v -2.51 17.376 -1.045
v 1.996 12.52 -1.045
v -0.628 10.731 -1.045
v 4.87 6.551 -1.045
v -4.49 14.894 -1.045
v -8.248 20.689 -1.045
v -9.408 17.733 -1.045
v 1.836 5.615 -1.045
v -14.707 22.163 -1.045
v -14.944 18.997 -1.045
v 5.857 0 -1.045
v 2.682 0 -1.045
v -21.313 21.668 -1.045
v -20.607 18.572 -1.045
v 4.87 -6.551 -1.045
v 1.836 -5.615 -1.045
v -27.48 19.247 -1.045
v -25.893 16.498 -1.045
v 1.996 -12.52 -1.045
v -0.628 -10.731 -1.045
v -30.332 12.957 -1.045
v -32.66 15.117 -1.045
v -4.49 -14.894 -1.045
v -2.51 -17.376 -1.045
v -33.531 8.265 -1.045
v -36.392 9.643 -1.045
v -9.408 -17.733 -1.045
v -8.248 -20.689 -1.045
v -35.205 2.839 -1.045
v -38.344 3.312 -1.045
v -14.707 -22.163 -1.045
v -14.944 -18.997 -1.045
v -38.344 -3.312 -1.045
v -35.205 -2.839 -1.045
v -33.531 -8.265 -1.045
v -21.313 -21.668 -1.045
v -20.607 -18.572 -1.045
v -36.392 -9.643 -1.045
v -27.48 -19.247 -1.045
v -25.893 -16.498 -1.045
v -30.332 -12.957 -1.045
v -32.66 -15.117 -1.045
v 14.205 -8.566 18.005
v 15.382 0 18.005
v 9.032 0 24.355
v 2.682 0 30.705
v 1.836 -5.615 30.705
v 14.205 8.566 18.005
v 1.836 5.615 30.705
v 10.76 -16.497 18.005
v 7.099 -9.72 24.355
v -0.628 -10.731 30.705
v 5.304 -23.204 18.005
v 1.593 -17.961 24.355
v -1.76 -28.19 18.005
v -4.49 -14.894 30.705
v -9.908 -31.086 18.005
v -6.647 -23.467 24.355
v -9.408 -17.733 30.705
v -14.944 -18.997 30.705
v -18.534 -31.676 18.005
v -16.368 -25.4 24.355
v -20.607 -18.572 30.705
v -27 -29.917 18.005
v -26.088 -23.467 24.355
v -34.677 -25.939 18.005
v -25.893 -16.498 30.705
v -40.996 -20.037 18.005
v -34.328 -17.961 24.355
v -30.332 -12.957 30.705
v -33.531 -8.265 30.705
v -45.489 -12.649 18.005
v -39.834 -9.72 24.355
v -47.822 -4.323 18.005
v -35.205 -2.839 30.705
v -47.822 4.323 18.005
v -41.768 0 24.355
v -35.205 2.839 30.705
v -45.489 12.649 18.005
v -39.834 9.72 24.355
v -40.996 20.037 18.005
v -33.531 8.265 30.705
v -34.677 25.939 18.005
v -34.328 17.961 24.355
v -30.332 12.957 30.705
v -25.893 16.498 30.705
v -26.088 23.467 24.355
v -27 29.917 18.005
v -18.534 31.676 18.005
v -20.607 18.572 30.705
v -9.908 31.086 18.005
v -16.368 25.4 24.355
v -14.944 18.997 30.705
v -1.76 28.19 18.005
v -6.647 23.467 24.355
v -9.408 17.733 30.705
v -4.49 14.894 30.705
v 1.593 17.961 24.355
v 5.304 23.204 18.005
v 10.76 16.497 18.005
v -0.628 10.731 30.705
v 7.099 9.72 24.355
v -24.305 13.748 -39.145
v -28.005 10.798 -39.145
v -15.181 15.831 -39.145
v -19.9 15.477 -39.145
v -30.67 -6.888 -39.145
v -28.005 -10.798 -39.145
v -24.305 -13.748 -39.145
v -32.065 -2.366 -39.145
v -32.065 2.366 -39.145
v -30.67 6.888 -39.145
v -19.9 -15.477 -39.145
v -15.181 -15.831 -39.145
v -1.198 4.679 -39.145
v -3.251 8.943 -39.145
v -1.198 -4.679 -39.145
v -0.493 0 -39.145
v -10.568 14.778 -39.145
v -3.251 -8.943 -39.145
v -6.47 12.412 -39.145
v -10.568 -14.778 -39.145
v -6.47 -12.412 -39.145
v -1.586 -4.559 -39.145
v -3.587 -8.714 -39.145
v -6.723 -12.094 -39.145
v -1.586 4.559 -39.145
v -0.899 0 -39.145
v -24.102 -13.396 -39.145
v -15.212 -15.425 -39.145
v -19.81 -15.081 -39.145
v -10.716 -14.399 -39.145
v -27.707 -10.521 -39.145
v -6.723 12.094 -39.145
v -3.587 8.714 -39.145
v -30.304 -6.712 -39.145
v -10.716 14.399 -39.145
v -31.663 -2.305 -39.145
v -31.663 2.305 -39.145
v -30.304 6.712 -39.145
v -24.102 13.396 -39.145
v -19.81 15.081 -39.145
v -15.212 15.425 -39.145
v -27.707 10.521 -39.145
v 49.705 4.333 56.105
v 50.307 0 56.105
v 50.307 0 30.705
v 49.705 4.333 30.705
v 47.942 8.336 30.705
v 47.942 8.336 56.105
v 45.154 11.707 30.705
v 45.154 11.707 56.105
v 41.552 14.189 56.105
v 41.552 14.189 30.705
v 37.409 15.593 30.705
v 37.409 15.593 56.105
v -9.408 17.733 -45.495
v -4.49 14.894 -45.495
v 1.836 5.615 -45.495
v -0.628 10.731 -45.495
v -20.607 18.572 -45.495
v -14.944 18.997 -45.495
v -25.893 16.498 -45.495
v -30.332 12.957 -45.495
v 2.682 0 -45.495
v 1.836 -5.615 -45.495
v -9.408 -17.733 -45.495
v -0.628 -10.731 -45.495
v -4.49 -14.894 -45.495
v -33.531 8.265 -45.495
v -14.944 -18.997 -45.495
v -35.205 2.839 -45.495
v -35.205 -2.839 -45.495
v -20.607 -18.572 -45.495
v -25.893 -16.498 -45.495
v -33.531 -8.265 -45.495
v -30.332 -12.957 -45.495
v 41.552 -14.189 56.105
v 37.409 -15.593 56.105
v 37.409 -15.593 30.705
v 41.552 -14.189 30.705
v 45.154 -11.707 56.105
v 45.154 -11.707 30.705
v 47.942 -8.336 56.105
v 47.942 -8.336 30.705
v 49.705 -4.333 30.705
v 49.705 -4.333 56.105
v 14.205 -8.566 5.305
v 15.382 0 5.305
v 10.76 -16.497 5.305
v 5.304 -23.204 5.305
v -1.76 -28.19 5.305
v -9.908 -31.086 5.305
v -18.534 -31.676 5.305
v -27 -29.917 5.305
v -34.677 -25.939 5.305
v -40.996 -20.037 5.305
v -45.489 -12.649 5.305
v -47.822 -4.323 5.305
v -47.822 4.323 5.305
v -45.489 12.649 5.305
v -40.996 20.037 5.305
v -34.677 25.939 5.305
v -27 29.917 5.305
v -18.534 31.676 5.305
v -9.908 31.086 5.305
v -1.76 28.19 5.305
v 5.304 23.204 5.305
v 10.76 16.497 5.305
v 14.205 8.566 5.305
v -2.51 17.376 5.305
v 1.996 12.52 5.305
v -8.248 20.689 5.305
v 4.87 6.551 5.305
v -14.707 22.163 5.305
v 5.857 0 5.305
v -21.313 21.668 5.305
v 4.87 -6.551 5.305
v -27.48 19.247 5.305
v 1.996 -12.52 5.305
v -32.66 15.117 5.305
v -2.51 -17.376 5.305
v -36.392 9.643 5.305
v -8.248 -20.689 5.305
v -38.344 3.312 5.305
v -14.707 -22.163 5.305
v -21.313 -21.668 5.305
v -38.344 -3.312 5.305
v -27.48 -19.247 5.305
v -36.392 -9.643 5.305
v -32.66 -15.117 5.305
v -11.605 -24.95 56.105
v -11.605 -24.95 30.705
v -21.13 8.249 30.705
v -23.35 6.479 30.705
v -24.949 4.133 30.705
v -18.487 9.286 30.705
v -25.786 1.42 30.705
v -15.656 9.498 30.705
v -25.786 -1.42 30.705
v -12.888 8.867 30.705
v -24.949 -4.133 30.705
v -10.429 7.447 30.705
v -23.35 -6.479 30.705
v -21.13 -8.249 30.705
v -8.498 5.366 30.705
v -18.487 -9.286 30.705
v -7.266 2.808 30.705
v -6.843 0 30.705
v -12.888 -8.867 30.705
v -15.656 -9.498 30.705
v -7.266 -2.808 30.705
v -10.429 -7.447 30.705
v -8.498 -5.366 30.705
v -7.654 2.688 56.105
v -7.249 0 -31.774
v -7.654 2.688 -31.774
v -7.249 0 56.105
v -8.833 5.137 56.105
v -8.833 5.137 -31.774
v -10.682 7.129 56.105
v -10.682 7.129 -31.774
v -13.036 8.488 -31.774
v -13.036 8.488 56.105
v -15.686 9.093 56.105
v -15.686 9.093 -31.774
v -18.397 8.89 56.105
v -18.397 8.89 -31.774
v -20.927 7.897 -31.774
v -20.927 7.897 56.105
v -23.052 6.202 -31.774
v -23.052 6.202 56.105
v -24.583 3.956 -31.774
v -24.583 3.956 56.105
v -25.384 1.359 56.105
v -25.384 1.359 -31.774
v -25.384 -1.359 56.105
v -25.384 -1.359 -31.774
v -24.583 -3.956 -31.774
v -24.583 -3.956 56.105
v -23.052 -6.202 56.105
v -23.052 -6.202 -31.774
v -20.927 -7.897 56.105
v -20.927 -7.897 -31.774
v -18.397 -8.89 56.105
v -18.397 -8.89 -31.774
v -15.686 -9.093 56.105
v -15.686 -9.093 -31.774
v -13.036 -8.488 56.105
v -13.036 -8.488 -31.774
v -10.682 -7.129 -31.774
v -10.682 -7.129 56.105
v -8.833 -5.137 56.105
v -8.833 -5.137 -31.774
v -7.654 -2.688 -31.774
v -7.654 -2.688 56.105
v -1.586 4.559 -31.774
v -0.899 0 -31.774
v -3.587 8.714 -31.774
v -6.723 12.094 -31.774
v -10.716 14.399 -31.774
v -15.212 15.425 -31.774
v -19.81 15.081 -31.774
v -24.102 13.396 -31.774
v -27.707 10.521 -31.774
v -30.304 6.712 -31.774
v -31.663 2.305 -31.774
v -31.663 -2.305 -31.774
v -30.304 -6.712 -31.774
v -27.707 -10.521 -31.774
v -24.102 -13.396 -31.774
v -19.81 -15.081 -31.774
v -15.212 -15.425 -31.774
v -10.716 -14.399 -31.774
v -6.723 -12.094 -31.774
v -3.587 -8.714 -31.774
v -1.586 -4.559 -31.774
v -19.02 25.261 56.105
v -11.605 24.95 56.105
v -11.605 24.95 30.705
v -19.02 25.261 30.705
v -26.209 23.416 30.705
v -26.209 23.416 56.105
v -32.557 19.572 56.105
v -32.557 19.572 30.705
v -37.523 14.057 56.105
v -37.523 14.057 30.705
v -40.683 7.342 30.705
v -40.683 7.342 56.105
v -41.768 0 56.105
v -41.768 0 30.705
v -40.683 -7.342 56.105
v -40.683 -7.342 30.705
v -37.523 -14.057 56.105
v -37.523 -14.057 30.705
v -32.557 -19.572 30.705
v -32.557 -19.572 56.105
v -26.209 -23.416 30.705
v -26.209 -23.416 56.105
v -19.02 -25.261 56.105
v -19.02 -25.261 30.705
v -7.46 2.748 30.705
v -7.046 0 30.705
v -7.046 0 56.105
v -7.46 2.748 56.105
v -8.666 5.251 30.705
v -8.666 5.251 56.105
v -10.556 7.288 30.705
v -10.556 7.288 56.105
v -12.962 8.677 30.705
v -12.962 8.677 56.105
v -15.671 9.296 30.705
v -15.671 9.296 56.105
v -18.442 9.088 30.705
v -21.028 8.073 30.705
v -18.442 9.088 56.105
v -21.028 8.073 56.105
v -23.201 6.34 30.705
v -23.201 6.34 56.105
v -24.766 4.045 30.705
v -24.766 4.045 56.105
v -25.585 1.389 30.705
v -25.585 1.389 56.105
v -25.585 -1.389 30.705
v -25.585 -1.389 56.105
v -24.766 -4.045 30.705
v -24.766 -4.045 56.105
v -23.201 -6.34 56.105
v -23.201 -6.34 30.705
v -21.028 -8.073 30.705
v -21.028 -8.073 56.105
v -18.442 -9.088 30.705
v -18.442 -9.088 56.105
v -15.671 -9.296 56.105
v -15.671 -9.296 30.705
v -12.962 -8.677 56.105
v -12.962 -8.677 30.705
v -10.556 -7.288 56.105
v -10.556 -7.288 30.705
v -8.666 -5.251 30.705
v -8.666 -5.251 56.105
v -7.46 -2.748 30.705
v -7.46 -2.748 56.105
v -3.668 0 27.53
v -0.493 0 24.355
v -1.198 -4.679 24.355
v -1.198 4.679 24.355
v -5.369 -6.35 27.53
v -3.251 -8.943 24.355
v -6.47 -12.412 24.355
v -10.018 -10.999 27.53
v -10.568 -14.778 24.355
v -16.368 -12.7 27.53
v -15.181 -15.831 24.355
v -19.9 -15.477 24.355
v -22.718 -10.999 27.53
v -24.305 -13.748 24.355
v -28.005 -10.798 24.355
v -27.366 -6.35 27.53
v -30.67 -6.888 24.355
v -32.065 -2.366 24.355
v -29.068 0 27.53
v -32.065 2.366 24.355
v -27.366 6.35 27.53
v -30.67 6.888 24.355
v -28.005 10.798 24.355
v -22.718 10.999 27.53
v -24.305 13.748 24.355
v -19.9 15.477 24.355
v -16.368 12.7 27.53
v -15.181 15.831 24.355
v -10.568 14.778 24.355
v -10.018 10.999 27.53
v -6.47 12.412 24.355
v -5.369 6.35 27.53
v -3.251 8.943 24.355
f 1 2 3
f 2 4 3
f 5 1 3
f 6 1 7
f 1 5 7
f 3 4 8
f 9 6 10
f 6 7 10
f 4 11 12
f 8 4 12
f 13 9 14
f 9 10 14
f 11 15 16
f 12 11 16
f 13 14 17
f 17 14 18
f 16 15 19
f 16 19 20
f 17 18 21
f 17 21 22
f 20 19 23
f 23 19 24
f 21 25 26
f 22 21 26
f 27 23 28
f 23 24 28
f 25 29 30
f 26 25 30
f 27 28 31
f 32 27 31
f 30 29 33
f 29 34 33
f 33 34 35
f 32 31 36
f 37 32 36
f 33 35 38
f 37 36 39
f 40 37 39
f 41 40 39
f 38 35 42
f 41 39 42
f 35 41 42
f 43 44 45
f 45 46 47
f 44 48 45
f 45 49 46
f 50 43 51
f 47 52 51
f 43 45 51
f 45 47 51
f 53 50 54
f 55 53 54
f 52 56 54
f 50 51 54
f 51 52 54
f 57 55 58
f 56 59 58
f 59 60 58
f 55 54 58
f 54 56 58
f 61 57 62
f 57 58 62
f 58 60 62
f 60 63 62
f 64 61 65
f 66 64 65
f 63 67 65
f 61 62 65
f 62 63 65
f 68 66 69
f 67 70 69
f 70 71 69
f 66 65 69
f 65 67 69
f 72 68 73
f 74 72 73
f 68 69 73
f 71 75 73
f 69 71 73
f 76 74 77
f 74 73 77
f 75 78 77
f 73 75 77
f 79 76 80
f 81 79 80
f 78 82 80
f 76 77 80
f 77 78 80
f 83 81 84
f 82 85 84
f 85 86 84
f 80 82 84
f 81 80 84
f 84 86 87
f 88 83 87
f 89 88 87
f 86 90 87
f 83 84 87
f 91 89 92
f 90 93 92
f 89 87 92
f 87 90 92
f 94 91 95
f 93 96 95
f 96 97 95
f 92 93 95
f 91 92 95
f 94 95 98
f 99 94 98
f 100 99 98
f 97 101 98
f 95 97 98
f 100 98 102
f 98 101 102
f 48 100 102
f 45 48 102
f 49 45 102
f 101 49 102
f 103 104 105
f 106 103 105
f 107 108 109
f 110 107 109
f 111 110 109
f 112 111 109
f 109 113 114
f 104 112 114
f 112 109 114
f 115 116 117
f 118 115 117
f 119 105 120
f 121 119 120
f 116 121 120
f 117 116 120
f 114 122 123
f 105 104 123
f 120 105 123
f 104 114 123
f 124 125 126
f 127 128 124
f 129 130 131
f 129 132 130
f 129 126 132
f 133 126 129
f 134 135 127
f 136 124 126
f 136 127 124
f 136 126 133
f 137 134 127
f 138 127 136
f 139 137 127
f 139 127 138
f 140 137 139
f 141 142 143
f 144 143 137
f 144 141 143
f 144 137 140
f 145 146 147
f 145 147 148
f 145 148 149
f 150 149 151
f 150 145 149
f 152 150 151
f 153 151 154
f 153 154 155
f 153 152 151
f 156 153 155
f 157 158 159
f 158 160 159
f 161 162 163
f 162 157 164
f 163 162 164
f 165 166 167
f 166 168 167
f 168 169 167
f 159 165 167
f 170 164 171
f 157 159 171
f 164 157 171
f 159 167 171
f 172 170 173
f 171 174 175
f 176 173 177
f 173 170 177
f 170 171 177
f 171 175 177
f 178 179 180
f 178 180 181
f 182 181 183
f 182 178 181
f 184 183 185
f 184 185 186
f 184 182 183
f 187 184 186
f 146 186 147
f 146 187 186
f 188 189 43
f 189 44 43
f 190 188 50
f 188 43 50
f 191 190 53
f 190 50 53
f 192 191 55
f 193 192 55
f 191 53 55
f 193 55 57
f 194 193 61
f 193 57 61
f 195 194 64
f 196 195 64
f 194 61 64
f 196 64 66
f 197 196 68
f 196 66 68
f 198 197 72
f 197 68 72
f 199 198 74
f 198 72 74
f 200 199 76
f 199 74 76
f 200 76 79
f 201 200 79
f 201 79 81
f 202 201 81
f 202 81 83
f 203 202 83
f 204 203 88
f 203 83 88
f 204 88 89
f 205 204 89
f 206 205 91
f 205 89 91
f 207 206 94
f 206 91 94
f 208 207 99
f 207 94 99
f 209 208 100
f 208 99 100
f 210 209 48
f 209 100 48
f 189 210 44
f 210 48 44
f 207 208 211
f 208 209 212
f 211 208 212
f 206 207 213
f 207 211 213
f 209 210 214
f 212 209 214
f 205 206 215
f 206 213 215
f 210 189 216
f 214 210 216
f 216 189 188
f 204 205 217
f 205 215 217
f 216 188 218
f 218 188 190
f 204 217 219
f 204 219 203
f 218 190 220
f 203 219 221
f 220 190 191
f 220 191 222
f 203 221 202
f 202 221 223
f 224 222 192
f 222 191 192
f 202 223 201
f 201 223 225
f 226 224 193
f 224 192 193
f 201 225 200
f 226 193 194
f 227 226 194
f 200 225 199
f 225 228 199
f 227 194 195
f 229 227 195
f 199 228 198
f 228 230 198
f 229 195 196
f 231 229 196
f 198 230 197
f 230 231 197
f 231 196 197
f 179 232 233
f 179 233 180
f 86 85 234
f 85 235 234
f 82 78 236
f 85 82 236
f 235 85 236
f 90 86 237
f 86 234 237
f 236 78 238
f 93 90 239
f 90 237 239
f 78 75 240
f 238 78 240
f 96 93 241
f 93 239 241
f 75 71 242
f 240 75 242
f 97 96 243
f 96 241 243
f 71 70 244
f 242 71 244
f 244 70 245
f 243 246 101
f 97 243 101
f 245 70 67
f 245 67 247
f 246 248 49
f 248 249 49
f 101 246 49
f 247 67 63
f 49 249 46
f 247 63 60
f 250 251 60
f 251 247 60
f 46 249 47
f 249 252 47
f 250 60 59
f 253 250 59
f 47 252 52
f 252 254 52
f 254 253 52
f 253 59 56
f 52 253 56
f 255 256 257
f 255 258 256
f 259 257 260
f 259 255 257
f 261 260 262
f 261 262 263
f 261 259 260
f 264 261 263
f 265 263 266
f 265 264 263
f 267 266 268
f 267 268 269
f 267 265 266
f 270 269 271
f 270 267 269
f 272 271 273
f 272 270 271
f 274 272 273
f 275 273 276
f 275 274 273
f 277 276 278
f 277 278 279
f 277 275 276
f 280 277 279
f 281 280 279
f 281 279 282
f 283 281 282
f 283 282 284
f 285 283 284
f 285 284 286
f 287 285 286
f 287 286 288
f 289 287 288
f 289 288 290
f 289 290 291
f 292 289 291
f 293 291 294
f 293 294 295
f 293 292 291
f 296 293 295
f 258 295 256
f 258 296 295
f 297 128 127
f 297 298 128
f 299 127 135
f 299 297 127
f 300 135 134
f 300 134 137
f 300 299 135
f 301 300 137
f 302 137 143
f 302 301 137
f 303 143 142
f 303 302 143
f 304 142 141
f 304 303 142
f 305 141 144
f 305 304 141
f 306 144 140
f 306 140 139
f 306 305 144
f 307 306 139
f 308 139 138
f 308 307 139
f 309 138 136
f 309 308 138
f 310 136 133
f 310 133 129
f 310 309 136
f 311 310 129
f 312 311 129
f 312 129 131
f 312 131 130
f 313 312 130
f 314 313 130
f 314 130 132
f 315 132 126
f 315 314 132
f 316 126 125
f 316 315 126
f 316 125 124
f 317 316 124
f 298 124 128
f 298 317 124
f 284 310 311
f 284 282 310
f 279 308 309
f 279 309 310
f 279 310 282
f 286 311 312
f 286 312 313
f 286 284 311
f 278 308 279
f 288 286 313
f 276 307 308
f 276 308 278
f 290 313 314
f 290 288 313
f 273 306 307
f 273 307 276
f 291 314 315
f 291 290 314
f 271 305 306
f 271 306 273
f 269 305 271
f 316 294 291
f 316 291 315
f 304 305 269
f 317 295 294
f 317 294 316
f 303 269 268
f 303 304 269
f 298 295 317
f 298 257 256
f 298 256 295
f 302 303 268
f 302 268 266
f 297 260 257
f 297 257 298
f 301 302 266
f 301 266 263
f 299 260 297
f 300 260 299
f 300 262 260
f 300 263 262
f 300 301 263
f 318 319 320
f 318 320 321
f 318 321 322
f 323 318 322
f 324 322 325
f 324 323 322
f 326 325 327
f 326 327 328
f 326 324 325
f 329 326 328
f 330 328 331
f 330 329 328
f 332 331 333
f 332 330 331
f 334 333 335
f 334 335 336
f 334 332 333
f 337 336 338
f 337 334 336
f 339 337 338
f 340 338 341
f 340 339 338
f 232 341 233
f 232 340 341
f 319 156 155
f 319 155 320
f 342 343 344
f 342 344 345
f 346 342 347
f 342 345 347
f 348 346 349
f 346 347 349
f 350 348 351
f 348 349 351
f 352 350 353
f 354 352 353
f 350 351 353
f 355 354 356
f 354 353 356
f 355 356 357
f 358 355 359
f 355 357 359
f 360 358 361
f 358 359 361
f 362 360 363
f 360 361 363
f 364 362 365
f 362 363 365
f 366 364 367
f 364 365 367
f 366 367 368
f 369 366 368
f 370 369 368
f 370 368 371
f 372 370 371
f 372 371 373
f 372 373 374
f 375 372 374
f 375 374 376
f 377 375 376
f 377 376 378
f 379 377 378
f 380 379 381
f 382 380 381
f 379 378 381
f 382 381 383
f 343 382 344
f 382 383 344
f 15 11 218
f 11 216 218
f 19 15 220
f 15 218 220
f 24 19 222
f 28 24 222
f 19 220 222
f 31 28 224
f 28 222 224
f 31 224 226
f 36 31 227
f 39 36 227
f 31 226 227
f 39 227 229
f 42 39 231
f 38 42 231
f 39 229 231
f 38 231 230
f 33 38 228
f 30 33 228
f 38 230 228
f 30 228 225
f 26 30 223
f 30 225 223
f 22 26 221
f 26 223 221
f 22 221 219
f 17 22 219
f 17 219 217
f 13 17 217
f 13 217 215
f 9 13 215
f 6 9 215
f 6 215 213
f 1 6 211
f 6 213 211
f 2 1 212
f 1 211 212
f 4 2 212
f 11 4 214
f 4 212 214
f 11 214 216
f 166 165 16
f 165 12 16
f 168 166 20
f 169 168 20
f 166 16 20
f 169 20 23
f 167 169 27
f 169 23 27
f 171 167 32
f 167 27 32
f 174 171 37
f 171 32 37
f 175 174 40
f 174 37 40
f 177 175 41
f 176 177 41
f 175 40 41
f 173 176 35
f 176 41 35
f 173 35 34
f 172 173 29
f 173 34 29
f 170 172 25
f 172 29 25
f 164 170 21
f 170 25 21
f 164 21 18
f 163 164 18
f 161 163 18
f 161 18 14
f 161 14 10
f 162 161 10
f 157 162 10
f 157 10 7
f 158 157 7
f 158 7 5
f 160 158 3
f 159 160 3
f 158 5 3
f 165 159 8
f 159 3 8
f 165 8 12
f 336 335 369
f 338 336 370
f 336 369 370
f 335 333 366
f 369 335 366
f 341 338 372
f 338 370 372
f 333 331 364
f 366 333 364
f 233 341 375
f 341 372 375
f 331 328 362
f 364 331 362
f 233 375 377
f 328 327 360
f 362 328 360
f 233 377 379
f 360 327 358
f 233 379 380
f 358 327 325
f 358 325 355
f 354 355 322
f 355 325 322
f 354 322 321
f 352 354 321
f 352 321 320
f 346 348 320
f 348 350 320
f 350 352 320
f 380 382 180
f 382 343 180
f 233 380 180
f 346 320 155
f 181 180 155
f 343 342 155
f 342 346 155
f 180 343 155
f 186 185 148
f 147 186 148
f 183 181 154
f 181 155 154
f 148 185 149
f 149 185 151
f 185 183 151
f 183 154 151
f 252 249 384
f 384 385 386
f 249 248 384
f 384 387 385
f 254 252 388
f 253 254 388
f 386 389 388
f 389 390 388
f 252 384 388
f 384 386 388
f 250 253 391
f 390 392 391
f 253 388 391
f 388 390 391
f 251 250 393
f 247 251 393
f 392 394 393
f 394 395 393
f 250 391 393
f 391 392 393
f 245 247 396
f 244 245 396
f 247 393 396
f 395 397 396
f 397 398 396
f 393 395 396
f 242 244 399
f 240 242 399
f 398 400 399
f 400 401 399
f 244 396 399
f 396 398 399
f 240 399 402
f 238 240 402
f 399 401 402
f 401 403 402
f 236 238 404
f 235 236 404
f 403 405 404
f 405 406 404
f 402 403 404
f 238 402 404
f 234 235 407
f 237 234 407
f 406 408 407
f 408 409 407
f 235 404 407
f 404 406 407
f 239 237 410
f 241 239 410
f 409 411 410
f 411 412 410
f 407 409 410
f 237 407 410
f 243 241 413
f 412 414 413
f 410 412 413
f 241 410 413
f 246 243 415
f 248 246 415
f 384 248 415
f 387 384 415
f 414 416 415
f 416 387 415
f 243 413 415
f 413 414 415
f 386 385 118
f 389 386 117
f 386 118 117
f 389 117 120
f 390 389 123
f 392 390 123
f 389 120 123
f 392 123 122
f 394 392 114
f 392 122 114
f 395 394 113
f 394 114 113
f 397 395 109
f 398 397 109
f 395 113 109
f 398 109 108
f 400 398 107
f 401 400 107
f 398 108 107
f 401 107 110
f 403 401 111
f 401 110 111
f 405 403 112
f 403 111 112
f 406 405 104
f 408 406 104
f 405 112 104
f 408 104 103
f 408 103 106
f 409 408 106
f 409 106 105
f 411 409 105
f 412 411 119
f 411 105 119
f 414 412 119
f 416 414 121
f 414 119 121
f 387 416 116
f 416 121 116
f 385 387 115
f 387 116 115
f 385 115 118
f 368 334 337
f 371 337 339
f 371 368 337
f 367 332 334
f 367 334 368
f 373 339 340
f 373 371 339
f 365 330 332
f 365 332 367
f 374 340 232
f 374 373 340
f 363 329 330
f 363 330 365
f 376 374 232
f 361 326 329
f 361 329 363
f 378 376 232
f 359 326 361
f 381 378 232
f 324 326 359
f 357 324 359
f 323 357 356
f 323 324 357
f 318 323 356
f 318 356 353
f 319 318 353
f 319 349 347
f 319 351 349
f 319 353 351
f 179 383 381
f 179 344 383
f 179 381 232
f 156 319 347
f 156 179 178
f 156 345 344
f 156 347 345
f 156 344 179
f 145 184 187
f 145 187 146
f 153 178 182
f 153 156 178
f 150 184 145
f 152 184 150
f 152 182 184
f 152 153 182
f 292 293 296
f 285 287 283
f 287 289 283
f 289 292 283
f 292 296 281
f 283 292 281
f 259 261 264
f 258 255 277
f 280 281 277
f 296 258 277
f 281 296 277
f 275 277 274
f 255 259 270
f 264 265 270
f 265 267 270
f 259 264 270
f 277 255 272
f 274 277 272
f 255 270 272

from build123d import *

# Parameters (mm, degrees)
F0_W     = 9.1186
F0_H     = 25.4
F3_R     = 9.3218
F4_DEPTH = 25.4


with BuildPart() as f1:
    # F0 (on Front) → F1 (revolve)
    with BuildSketch(Plane.XZ):
        Polygon((2.682442, 30.704564), (-6.842558, 30.704564), (-0.492558, 24.354564), (-0.492558, -39.145436), (-0.898958, -39.145436), (-16.367558, -39.145436), (-16.367558, -45.495436), (2.682442, -45.495436), (2.682442, -1.045436), (5.857442, -1.045436), (5.857442, 5.304564), (15.382442, 5.304564), (15.382442, 18.004564), align=None)
    revolve(axis=Axis((-16.367558, 0, -15.134403), (0, 0, -1)))


with BuildPart() as f2:
    # F0 (on Front) → F2 (revolve)
    with BuildSketch(Plane.XZ):
        with Locations((-11.808258, 43.404564)):
            Rectangle(F0_W, F0_H)
        Polygon((-7.248958, -31.773925), (-7.248958, 30.704564), (-16.367558, 30.704564), (-16.367558, -39.145436), (-0.898958, -39.145436), (-0.898958, -31.773925), align=None)
    revolve(axis=Axis((-16.367558, 0, 43.404564), (0, 0, 1)))


with BuildPart() as f4:
    # F3 (on face) → F4 (new body)
    with BuildSketch(Plane.XY.offset(56.104564)):
        with BuildLine():
            ThreePointArc((-11.605058, -24.949521), (3.204457, -16.189387), (9.032442, 0))
            ThreePointArc((9.032442, 0), (3.204457, 16.189387), (-11.605058, 24.949521))
            ThreePointArc((-11.605058, 24.949521), (-41.767558, 0), (-11.605058, -24.949521))
        make_face()
        with Locations((-16.367558, 0)):
            Circle(F3_R, mode=Mode.SUBTRACT)
        with BuildLine():
            ThreePointArc((-11.605058, 24.949521), (3.204457, 16.189387), (9.032442, 0))
            ThreePointArc((9.032442, 0), (3.204457, -16.189387), (-11.605058, -24.949521))
            Line((-11.605058, -24.949521), (37.409005, -15.593451))
            ThreePointArc((37.409005, -15.593451), (18.557442, 0), (37.409005, 15.593451))
            Line((37.409005, 15.593451), (-11.605058, 24.949521))
        make_face()
        with BuildLine():
            ThreePointArc((50.307442, 0), (46.664951, 10.118367), (37.409005, 15.593451))
            ThreePointArc((37.409005, 15.593451), (18.557442, 0), (37.409005, -15.593451))
            ThreePointArc((37.409005, -15.593451), (46.664951, -10.118367), (50.307442, 0))
        make_face()
    extrude(amount=-F4_DEPTH)


solid = Compound([f1.part, f2.part, f4.part])
